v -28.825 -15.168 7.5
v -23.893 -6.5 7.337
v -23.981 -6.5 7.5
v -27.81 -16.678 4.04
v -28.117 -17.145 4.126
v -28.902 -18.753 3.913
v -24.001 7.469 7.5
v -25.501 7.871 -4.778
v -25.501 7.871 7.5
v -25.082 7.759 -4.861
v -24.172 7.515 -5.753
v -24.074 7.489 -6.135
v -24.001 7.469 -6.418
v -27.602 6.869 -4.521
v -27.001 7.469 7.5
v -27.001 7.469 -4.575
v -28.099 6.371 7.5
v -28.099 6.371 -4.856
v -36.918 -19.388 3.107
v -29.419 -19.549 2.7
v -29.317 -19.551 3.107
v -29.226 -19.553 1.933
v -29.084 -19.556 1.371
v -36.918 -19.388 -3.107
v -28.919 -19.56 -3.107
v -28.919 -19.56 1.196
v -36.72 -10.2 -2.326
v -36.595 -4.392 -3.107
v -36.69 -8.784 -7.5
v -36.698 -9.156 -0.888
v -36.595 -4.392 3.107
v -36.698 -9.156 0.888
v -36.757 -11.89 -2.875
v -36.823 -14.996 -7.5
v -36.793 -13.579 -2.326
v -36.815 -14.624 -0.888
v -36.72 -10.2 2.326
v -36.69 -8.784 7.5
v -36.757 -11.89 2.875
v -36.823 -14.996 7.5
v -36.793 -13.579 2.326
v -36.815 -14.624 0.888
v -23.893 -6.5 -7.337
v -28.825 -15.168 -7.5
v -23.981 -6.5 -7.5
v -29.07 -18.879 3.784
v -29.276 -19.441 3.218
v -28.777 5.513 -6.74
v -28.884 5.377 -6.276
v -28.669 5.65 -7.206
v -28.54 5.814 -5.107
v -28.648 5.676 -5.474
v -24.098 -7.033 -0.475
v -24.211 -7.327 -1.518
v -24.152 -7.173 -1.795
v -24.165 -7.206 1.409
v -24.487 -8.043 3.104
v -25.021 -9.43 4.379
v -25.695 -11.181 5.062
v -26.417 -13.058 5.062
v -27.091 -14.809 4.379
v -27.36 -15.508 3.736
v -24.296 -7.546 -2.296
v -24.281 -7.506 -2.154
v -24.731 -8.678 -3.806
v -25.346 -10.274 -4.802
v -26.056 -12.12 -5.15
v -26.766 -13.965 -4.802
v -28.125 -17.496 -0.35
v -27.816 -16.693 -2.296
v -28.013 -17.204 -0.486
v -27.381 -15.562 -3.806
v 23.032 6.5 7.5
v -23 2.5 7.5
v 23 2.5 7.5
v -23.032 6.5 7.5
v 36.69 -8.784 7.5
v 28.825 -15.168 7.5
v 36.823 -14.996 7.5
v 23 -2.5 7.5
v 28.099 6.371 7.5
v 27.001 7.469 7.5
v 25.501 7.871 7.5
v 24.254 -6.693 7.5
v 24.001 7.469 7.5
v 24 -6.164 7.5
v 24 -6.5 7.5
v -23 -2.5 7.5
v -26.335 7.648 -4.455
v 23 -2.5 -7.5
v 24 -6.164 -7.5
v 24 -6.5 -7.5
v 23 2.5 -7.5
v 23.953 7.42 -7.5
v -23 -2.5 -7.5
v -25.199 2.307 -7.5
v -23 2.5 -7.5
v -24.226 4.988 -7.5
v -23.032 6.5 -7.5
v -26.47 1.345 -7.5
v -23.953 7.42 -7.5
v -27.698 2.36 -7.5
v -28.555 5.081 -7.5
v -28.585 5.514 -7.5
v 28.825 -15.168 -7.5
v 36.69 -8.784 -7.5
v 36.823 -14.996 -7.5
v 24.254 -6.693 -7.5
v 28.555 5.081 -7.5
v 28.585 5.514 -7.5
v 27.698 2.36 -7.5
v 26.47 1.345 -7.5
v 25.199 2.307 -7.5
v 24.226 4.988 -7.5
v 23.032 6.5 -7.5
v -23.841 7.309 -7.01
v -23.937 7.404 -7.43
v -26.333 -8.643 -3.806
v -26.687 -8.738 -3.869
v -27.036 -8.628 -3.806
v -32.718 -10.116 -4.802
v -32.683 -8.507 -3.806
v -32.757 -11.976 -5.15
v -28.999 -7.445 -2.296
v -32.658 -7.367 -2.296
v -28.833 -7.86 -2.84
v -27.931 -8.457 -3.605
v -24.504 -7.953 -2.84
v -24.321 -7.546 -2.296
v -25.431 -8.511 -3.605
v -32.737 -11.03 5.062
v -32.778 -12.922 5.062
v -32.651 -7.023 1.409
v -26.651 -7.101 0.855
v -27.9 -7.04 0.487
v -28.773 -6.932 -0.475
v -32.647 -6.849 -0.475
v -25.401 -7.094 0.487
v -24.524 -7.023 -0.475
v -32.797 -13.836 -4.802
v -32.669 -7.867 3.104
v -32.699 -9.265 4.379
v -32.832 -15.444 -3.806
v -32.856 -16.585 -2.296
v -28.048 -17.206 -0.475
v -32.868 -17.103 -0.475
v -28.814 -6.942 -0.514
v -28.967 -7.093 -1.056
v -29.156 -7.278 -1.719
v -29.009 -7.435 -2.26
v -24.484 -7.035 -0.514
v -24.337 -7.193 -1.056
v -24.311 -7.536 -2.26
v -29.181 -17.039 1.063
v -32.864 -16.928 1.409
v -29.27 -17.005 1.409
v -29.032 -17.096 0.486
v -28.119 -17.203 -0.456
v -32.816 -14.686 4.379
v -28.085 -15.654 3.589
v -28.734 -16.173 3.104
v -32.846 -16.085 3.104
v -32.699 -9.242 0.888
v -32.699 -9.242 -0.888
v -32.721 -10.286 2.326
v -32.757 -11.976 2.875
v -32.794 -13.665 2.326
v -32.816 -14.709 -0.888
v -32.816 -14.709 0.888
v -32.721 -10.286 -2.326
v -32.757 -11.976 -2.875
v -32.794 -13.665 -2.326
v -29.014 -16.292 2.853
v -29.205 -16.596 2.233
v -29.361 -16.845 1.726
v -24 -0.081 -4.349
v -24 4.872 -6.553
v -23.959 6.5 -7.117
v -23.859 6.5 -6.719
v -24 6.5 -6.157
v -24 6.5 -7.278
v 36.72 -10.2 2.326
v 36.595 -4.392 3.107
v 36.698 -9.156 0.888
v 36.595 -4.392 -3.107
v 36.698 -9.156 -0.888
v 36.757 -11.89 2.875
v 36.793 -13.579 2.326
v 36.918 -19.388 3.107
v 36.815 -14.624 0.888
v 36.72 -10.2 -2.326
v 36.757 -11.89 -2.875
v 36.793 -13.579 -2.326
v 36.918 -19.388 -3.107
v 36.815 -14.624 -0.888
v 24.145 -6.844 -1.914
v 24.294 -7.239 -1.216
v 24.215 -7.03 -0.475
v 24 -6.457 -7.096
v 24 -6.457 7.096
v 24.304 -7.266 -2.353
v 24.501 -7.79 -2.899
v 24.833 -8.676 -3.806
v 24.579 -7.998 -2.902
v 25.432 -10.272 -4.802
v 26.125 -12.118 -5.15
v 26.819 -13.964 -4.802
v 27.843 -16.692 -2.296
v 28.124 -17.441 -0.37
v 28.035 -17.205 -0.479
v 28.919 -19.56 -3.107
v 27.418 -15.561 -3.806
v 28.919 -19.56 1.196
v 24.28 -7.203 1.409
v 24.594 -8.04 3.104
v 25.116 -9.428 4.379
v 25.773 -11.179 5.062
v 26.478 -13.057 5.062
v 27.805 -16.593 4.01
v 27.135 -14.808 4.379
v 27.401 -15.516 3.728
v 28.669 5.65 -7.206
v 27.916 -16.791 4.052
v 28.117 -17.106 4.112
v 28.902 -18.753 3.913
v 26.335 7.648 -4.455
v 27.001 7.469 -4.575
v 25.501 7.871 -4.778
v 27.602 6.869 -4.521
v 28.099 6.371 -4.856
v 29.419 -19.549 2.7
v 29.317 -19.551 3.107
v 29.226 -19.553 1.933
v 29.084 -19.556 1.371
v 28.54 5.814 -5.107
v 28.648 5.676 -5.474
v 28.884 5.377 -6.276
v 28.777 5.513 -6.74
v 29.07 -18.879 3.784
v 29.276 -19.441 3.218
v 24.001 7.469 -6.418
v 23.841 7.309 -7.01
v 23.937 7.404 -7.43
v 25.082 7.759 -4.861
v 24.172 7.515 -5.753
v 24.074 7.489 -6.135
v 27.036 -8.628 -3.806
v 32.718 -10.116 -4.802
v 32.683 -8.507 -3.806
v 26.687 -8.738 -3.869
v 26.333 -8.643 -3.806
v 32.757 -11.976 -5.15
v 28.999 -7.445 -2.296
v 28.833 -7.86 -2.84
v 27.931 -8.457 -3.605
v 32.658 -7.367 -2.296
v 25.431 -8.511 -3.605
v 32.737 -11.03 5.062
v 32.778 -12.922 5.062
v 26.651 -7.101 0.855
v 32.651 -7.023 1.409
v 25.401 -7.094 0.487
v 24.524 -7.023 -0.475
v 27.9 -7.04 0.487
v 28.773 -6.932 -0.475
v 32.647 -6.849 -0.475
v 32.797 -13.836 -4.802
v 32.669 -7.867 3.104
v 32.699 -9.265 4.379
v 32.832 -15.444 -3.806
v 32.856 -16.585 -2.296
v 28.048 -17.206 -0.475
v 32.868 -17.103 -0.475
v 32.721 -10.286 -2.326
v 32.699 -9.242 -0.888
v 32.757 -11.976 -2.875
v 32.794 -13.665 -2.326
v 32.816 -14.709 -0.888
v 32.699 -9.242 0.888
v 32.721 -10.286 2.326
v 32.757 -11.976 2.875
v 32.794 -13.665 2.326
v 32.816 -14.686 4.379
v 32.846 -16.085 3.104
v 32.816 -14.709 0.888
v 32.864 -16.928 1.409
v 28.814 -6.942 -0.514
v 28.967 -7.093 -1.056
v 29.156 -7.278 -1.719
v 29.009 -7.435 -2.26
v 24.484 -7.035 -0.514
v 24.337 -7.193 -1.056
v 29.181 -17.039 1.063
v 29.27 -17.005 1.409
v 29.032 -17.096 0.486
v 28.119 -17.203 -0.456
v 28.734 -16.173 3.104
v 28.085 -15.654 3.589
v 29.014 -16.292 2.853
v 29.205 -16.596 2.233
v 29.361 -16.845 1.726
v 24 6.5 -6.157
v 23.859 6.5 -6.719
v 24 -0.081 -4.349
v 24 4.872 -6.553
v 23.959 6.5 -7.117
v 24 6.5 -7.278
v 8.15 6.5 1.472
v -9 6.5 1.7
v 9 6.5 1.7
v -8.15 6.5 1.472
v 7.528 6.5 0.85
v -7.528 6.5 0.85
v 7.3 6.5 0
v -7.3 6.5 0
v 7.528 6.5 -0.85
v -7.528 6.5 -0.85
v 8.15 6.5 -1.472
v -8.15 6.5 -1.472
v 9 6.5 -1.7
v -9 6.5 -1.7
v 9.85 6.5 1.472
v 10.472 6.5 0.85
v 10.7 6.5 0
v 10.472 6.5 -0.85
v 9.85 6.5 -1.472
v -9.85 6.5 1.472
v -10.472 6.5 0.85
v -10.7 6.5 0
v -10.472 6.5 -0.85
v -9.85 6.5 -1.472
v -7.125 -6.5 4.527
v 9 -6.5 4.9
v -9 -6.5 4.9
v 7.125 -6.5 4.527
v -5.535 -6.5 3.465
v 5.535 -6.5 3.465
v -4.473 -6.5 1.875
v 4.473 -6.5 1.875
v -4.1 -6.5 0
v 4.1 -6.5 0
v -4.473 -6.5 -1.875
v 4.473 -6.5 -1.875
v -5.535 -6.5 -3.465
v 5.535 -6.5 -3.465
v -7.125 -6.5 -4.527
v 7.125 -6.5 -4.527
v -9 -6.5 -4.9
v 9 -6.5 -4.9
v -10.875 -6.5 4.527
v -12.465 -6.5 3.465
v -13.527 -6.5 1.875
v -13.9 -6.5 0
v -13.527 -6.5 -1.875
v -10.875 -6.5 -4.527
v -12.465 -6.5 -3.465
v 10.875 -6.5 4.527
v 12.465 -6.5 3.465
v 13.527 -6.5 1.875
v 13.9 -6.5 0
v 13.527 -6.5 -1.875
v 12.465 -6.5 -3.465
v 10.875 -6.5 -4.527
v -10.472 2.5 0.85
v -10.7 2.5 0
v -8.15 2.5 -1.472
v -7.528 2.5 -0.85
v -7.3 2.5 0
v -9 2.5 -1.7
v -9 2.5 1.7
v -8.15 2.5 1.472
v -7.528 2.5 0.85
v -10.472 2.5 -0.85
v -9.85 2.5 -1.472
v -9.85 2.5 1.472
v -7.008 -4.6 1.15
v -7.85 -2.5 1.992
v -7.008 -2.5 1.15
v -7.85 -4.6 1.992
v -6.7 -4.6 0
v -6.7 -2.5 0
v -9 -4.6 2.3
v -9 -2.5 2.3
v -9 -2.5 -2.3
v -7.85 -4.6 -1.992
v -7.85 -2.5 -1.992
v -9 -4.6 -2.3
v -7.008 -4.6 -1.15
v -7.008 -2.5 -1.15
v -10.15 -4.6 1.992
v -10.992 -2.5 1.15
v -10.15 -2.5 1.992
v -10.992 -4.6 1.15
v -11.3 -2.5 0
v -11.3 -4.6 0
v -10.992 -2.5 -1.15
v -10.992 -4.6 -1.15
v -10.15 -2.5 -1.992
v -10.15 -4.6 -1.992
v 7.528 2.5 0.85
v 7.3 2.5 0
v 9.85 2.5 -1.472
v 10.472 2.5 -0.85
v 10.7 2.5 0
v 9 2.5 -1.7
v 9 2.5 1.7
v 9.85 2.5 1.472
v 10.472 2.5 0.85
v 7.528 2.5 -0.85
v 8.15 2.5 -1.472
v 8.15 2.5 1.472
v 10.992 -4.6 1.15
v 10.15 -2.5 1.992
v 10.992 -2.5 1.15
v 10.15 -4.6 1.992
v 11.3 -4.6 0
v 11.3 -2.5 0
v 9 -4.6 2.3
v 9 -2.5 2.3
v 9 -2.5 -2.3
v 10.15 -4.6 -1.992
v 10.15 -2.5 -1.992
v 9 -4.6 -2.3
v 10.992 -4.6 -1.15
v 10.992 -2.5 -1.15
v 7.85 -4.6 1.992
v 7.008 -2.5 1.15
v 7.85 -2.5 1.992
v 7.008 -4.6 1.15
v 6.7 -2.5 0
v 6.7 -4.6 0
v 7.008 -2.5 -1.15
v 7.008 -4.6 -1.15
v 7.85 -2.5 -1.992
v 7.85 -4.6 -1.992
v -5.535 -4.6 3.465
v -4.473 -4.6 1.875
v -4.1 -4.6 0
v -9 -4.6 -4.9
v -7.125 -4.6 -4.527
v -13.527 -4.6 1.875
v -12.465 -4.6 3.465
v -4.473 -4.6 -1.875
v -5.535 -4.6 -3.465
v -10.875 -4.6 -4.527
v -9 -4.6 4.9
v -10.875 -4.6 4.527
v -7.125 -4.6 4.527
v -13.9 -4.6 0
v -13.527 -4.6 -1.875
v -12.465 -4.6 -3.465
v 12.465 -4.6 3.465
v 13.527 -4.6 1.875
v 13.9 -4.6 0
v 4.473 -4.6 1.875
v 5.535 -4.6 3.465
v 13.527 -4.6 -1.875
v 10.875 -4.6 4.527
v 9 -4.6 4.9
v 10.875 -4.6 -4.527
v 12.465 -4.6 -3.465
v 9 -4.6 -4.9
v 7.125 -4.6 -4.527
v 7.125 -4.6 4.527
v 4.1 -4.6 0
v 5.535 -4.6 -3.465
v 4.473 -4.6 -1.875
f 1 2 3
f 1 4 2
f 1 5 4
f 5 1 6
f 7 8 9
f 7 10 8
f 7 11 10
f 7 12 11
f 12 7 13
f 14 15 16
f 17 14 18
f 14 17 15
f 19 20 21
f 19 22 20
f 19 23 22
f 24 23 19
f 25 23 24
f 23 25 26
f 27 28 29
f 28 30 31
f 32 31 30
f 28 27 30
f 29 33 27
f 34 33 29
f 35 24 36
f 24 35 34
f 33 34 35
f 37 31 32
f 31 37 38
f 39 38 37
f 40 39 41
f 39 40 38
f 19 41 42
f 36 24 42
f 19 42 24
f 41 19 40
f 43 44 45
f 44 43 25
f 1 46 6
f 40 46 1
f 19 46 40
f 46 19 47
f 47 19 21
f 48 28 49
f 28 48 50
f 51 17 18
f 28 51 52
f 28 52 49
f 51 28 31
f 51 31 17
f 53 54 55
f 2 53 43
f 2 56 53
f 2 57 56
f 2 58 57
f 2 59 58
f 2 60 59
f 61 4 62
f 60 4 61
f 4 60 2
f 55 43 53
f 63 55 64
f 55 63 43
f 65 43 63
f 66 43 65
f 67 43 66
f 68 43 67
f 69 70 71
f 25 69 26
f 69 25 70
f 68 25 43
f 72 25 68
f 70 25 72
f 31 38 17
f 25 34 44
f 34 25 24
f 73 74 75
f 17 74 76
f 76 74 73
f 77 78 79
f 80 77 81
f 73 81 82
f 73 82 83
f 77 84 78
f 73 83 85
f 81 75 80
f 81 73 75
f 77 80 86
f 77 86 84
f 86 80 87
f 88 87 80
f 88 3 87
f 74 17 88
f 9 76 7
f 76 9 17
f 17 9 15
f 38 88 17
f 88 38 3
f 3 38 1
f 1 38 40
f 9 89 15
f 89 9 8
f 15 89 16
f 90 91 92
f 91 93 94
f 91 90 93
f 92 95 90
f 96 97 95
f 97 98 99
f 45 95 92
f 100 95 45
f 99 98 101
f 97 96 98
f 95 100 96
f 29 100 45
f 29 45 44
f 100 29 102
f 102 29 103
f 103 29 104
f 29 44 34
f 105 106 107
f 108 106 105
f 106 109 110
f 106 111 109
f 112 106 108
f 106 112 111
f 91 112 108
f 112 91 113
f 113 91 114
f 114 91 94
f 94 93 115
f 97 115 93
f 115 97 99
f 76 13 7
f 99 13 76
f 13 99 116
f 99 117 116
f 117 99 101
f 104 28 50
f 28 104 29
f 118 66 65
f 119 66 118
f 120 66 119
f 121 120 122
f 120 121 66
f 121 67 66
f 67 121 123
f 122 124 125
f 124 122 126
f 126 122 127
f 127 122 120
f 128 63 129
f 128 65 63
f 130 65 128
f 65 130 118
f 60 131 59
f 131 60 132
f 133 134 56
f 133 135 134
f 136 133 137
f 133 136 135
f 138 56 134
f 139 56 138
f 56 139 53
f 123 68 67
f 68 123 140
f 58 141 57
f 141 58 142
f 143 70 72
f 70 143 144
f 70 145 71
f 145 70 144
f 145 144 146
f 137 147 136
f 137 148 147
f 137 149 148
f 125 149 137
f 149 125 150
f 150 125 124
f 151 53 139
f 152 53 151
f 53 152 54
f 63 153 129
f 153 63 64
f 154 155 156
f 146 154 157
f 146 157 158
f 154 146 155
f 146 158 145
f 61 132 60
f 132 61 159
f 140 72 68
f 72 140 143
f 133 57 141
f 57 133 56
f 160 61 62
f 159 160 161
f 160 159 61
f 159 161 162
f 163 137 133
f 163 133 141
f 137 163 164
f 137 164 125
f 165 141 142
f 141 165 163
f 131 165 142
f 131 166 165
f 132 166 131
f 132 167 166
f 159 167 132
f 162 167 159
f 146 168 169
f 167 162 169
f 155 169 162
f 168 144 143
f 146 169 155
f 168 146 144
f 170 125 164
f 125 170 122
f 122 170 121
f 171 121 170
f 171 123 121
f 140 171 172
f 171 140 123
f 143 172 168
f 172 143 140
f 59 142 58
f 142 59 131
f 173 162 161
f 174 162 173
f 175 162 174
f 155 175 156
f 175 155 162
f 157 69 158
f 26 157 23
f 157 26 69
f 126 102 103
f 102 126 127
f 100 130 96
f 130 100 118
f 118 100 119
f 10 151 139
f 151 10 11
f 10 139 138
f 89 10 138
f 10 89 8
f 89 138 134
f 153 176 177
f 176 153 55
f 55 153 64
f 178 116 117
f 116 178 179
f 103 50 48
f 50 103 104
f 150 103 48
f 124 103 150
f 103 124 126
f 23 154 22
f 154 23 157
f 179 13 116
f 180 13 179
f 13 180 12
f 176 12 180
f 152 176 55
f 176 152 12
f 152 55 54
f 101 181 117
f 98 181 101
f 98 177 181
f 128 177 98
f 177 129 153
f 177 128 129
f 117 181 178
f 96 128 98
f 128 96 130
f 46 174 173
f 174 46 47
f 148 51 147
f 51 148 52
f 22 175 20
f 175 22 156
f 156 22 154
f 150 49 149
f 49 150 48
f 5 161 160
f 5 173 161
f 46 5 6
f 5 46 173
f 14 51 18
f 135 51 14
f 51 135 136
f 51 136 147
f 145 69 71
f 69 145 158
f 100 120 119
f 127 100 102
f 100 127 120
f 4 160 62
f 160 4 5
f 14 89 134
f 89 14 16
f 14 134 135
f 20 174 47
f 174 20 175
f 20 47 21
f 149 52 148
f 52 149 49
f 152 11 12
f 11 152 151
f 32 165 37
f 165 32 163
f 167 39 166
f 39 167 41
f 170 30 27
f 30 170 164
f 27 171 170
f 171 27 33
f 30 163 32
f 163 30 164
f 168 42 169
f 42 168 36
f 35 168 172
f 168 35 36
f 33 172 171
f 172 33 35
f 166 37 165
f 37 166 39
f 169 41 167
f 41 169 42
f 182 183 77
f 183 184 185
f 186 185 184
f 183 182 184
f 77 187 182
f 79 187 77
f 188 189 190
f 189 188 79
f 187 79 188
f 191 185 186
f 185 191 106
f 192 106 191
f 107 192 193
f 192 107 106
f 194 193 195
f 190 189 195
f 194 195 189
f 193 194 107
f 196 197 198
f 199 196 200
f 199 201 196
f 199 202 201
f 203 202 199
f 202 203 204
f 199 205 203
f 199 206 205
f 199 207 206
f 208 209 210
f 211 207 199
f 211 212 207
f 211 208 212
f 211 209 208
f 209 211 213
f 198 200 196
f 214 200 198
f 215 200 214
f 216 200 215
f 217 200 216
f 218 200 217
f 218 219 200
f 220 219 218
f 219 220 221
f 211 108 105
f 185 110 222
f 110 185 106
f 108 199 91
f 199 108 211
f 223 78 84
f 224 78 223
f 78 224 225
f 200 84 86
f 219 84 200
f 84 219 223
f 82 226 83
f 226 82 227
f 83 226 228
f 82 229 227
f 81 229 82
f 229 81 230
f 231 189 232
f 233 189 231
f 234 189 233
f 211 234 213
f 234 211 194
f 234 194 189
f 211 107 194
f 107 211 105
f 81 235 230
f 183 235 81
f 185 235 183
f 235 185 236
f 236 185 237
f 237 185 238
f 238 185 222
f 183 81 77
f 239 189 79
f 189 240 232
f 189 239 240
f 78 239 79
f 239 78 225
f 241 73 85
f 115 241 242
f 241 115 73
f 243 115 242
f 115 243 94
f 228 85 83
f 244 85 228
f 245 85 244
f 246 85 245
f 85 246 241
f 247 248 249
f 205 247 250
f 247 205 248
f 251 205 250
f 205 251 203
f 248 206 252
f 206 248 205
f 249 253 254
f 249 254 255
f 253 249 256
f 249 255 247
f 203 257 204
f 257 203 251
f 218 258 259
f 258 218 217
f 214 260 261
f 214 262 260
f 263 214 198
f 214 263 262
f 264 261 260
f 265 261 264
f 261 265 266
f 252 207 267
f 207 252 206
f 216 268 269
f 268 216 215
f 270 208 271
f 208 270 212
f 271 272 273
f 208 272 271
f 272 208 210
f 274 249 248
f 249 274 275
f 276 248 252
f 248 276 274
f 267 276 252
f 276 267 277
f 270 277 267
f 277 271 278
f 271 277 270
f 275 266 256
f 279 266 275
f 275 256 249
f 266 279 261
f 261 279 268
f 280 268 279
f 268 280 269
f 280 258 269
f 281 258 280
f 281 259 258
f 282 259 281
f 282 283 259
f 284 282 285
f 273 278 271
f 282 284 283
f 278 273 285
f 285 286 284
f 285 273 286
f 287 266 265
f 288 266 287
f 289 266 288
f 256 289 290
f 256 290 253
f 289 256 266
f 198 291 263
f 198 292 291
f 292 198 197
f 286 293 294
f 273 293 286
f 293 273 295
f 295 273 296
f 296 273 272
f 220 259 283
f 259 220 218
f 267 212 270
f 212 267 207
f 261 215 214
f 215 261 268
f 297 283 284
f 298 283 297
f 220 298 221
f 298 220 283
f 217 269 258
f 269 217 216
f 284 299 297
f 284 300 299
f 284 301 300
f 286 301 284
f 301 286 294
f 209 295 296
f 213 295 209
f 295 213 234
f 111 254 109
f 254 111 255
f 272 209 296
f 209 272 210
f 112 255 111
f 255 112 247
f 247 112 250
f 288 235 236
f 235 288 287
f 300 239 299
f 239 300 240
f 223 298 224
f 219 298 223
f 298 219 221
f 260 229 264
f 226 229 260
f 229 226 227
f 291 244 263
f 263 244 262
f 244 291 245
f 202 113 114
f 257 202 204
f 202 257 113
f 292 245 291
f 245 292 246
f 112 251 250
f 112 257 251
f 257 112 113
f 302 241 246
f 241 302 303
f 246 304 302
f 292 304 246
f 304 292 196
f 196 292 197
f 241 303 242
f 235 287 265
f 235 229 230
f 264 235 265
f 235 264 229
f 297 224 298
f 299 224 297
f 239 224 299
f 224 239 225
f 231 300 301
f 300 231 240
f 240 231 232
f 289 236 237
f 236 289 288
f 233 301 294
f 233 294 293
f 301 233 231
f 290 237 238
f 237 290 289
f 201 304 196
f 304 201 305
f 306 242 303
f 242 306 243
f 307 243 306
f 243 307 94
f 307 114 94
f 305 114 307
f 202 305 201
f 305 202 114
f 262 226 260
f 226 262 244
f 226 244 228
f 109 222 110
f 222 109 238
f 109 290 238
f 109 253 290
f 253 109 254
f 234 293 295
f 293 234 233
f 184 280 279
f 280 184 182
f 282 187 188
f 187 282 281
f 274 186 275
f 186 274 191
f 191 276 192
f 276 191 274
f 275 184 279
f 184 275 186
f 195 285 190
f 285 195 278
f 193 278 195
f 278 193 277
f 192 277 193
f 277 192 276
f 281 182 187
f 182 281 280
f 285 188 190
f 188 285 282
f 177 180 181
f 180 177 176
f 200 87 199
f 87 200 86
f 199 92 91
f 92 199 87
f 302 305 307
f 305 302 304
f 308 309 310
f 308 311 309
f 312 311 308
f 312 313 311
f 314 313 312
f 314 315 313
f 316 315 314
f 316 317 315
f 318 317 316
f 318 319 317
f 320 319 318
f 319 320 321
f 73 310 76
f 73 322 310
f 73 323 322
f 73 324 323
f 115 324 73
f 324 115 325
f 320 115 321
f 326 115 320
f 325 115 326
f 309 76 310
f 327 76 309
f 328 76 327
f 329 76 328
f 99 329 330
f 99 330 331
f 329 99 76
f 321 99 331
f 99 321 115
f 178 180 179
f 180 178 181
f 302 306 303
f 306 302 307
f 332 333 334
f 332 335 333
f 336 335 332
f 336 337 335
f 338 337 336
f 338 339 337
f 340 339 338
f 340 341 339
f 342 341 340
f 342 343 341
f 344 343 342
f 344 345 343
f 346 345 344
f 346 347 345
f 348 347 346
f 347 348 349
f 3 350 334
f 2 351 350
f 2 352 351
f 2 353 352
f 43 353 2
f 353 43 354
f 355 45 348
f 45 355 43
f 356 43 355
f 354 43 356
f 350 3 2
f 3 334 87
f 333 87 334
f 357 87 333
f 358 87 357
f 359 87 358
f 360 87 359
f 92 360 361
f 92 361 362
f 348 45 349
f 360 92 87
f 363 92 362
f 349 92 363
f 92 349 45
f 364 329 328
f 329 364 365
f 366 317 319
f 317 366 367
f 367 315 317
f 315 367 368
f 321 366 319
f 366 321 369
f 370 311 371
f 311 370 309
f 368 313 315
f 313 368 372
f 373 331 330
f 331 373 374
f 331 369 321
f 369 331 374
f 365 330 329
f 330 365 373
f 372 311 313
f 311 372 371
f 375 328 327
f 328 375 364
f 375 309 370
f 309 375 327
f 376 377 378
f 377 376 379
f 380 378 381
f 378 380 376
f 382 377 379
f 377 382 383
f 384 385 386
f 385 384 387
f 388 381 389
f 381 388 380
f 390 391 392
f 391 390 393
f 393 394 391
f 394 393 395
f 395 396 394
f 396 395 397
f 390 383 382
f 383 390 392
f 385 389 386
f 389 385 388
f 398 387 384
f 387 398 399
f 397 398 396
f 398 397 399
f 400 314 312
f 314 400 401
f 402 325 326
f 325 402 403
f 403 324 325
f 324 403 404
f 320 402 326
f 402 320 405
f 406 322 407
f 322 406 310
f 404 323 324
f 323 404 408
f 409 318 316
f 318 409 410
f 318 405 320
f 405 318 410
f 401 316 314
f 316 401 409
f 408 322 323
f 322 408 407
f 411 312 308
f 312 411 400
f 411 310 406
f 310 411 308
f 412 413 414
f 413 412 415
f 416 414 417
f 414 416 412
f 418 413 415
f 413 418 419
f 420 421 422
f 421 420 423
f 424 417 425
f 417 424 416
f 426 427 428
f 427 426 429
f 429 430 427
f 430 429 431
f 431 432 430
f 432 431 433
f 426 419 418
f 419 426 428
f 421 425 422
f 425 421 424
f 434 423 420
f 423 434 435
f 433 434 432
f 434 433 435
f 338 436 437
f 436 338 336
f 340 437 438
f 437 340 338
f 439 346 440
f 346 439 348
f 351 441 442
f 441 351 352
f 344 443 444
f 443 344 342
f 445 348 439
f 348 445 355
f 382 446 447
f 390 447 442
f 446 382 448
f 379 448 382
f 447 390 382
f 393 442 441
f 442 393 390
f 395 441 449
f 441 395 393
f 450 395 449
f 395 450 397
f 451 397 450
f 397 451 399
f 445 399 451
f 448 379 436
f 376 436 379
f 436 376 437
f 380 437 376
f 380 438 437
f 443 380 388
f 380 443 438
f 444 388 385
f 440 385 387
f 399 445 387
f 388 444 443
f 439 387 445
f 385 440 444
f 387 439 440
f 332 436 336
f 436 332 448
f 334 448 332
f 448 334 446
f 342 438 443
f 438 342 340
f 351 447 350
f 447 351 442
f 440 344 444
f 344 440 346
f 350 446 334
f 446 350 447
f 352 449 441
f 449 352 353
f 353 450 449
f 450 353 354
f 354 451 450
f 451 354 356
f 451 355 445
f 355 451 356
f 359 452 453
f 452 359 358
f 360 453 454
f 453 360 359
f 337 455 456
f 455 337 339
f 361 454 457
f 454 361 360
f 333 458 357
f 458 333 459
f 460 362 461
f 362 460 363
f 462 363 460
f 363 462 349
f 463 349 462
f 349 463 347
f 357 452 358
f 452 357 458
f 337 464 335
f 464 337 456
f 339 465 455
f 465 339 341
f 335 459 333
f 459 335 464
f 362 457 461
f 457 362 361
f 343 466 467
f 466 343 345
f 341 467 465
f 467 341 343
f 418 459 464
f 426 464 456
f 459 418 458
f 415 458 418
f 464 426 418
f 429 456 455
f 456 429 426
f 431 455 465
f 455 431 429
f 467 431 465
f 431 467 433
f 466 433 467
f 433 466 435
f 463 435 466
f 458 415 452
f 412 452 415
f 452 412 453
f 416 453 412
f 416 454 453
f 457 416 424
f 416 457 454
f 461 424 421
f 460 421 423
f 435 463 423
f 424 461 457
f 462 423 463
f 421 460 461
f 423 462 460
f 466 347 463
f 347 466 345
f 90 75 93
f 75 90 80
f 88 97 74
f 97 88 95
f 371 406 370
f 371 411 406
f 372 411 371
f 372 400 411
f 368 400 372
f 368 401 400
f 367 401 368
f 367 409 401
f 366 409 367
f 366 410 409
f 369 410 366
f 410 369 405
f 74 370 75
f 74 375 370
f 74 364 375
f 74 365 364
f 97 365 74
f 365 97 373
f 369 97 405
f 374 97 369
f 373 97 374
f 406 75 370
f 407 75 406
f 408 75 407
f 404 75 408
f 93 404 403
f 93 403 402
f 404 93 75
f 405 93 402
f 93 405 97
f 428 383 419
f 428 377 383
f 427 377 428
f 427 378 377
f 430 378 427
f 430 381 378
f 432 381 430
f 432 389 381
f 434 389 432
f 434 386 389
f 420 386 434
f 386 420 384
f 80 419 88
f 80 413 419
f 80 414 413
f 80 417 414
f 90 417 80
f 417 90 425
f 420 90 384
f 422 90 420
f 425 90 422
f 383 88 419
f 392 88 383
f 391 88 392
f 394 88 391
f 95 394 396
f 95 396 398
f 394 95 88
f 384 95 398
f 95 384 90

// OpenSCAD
fenderWidth = 46;
fenderThick = 5;

stayAngle = asin(6/(11*25.4));

otherAngle = atan(90/250);

module fenderStay(dir=1) {
    translate([0,8,0]) {
        rotate([90,0,stayAngle*dir]) cylinder(d=5, h=13*25.4, center=false);
        /*translate([0,-9,0]) rotate([90,0,90*dir+stayAngle*dir]) cylinder(d=3.5, h=12, center=false);*/
    }
}

rotate([0,0,0]) difference() {
    union() {
        hull() {
            cube([fenderWidth+2, fenderThick+8, 15], center=true);
            /*translate([-fenderWidth/2-3, 0, 0]) cylinder(d=10, h=15, center=true);
            translate([fenderWidth/2+3, 0, 0]) cylinder(d=10, h=15, center=true);*/
        }
        for (ii=[-1:2:1]) {
            translate([ii*(fenderWidth/2+8.5),0,0]) rotate([0,90,ii*stayAngle]) difference() {
                hull() {
                    translate([0,0,-ii*6]) rotate([ii*stayAngle,0,0]) {
                        translate([0,fenderThick,0]) rotate([0,90,0]) cylinder(d=6, h=15, center=true, $fn=12);
                        translate([0,-fenderThick,0]) rotate([0,90,0]) cylinder(d=4, h=15, center=true);
                    }
                    translate([0,-offset,ii]) rotate([0,0,22.5]) cylinder(d=15/cos(180/8), h=8, center=true, $fn=8);
                }

                translate([0,-offset,-ii*4]) cylinder(d=10.3, h=10, center=true);
                #translate([0,-offset,-5*ii]) rotate([90,0,-otherAngle]) cylinder(d=5, h=100, center=true, $fn=12);

                translate([0,-offset,0]) cylinder(d=5.75, h=10, center=true);
            }
        }
    }

    cube([fenderWidth, fenderThick, 25], center=true);
    *translate([fenderWidth/2 + 4,0,0]) fenderStay(1);
    *translate([-(fenderWidth/2 + 4),0,0]) fenderStay(-1);
    for (xx=[-9:18:9]) {
        translate([xx,-(fenderThick/2+2.1),0]) rotate([90,0,0]) cylinder(d=9.8, h=6, center=false);
        translate([xx, 0, 0]) {
            rotate([-90,0,0]) cylinder(d=3.4, h=25, center=false, $fn=12);
            rotate([90,0,0]) cylinder(d=4.6, h=25, center=false, $fn=12);
        }
    }
    #translate([0,-32,0]) cylinder(d=34, h=10, center=true);
}
offset=12;
